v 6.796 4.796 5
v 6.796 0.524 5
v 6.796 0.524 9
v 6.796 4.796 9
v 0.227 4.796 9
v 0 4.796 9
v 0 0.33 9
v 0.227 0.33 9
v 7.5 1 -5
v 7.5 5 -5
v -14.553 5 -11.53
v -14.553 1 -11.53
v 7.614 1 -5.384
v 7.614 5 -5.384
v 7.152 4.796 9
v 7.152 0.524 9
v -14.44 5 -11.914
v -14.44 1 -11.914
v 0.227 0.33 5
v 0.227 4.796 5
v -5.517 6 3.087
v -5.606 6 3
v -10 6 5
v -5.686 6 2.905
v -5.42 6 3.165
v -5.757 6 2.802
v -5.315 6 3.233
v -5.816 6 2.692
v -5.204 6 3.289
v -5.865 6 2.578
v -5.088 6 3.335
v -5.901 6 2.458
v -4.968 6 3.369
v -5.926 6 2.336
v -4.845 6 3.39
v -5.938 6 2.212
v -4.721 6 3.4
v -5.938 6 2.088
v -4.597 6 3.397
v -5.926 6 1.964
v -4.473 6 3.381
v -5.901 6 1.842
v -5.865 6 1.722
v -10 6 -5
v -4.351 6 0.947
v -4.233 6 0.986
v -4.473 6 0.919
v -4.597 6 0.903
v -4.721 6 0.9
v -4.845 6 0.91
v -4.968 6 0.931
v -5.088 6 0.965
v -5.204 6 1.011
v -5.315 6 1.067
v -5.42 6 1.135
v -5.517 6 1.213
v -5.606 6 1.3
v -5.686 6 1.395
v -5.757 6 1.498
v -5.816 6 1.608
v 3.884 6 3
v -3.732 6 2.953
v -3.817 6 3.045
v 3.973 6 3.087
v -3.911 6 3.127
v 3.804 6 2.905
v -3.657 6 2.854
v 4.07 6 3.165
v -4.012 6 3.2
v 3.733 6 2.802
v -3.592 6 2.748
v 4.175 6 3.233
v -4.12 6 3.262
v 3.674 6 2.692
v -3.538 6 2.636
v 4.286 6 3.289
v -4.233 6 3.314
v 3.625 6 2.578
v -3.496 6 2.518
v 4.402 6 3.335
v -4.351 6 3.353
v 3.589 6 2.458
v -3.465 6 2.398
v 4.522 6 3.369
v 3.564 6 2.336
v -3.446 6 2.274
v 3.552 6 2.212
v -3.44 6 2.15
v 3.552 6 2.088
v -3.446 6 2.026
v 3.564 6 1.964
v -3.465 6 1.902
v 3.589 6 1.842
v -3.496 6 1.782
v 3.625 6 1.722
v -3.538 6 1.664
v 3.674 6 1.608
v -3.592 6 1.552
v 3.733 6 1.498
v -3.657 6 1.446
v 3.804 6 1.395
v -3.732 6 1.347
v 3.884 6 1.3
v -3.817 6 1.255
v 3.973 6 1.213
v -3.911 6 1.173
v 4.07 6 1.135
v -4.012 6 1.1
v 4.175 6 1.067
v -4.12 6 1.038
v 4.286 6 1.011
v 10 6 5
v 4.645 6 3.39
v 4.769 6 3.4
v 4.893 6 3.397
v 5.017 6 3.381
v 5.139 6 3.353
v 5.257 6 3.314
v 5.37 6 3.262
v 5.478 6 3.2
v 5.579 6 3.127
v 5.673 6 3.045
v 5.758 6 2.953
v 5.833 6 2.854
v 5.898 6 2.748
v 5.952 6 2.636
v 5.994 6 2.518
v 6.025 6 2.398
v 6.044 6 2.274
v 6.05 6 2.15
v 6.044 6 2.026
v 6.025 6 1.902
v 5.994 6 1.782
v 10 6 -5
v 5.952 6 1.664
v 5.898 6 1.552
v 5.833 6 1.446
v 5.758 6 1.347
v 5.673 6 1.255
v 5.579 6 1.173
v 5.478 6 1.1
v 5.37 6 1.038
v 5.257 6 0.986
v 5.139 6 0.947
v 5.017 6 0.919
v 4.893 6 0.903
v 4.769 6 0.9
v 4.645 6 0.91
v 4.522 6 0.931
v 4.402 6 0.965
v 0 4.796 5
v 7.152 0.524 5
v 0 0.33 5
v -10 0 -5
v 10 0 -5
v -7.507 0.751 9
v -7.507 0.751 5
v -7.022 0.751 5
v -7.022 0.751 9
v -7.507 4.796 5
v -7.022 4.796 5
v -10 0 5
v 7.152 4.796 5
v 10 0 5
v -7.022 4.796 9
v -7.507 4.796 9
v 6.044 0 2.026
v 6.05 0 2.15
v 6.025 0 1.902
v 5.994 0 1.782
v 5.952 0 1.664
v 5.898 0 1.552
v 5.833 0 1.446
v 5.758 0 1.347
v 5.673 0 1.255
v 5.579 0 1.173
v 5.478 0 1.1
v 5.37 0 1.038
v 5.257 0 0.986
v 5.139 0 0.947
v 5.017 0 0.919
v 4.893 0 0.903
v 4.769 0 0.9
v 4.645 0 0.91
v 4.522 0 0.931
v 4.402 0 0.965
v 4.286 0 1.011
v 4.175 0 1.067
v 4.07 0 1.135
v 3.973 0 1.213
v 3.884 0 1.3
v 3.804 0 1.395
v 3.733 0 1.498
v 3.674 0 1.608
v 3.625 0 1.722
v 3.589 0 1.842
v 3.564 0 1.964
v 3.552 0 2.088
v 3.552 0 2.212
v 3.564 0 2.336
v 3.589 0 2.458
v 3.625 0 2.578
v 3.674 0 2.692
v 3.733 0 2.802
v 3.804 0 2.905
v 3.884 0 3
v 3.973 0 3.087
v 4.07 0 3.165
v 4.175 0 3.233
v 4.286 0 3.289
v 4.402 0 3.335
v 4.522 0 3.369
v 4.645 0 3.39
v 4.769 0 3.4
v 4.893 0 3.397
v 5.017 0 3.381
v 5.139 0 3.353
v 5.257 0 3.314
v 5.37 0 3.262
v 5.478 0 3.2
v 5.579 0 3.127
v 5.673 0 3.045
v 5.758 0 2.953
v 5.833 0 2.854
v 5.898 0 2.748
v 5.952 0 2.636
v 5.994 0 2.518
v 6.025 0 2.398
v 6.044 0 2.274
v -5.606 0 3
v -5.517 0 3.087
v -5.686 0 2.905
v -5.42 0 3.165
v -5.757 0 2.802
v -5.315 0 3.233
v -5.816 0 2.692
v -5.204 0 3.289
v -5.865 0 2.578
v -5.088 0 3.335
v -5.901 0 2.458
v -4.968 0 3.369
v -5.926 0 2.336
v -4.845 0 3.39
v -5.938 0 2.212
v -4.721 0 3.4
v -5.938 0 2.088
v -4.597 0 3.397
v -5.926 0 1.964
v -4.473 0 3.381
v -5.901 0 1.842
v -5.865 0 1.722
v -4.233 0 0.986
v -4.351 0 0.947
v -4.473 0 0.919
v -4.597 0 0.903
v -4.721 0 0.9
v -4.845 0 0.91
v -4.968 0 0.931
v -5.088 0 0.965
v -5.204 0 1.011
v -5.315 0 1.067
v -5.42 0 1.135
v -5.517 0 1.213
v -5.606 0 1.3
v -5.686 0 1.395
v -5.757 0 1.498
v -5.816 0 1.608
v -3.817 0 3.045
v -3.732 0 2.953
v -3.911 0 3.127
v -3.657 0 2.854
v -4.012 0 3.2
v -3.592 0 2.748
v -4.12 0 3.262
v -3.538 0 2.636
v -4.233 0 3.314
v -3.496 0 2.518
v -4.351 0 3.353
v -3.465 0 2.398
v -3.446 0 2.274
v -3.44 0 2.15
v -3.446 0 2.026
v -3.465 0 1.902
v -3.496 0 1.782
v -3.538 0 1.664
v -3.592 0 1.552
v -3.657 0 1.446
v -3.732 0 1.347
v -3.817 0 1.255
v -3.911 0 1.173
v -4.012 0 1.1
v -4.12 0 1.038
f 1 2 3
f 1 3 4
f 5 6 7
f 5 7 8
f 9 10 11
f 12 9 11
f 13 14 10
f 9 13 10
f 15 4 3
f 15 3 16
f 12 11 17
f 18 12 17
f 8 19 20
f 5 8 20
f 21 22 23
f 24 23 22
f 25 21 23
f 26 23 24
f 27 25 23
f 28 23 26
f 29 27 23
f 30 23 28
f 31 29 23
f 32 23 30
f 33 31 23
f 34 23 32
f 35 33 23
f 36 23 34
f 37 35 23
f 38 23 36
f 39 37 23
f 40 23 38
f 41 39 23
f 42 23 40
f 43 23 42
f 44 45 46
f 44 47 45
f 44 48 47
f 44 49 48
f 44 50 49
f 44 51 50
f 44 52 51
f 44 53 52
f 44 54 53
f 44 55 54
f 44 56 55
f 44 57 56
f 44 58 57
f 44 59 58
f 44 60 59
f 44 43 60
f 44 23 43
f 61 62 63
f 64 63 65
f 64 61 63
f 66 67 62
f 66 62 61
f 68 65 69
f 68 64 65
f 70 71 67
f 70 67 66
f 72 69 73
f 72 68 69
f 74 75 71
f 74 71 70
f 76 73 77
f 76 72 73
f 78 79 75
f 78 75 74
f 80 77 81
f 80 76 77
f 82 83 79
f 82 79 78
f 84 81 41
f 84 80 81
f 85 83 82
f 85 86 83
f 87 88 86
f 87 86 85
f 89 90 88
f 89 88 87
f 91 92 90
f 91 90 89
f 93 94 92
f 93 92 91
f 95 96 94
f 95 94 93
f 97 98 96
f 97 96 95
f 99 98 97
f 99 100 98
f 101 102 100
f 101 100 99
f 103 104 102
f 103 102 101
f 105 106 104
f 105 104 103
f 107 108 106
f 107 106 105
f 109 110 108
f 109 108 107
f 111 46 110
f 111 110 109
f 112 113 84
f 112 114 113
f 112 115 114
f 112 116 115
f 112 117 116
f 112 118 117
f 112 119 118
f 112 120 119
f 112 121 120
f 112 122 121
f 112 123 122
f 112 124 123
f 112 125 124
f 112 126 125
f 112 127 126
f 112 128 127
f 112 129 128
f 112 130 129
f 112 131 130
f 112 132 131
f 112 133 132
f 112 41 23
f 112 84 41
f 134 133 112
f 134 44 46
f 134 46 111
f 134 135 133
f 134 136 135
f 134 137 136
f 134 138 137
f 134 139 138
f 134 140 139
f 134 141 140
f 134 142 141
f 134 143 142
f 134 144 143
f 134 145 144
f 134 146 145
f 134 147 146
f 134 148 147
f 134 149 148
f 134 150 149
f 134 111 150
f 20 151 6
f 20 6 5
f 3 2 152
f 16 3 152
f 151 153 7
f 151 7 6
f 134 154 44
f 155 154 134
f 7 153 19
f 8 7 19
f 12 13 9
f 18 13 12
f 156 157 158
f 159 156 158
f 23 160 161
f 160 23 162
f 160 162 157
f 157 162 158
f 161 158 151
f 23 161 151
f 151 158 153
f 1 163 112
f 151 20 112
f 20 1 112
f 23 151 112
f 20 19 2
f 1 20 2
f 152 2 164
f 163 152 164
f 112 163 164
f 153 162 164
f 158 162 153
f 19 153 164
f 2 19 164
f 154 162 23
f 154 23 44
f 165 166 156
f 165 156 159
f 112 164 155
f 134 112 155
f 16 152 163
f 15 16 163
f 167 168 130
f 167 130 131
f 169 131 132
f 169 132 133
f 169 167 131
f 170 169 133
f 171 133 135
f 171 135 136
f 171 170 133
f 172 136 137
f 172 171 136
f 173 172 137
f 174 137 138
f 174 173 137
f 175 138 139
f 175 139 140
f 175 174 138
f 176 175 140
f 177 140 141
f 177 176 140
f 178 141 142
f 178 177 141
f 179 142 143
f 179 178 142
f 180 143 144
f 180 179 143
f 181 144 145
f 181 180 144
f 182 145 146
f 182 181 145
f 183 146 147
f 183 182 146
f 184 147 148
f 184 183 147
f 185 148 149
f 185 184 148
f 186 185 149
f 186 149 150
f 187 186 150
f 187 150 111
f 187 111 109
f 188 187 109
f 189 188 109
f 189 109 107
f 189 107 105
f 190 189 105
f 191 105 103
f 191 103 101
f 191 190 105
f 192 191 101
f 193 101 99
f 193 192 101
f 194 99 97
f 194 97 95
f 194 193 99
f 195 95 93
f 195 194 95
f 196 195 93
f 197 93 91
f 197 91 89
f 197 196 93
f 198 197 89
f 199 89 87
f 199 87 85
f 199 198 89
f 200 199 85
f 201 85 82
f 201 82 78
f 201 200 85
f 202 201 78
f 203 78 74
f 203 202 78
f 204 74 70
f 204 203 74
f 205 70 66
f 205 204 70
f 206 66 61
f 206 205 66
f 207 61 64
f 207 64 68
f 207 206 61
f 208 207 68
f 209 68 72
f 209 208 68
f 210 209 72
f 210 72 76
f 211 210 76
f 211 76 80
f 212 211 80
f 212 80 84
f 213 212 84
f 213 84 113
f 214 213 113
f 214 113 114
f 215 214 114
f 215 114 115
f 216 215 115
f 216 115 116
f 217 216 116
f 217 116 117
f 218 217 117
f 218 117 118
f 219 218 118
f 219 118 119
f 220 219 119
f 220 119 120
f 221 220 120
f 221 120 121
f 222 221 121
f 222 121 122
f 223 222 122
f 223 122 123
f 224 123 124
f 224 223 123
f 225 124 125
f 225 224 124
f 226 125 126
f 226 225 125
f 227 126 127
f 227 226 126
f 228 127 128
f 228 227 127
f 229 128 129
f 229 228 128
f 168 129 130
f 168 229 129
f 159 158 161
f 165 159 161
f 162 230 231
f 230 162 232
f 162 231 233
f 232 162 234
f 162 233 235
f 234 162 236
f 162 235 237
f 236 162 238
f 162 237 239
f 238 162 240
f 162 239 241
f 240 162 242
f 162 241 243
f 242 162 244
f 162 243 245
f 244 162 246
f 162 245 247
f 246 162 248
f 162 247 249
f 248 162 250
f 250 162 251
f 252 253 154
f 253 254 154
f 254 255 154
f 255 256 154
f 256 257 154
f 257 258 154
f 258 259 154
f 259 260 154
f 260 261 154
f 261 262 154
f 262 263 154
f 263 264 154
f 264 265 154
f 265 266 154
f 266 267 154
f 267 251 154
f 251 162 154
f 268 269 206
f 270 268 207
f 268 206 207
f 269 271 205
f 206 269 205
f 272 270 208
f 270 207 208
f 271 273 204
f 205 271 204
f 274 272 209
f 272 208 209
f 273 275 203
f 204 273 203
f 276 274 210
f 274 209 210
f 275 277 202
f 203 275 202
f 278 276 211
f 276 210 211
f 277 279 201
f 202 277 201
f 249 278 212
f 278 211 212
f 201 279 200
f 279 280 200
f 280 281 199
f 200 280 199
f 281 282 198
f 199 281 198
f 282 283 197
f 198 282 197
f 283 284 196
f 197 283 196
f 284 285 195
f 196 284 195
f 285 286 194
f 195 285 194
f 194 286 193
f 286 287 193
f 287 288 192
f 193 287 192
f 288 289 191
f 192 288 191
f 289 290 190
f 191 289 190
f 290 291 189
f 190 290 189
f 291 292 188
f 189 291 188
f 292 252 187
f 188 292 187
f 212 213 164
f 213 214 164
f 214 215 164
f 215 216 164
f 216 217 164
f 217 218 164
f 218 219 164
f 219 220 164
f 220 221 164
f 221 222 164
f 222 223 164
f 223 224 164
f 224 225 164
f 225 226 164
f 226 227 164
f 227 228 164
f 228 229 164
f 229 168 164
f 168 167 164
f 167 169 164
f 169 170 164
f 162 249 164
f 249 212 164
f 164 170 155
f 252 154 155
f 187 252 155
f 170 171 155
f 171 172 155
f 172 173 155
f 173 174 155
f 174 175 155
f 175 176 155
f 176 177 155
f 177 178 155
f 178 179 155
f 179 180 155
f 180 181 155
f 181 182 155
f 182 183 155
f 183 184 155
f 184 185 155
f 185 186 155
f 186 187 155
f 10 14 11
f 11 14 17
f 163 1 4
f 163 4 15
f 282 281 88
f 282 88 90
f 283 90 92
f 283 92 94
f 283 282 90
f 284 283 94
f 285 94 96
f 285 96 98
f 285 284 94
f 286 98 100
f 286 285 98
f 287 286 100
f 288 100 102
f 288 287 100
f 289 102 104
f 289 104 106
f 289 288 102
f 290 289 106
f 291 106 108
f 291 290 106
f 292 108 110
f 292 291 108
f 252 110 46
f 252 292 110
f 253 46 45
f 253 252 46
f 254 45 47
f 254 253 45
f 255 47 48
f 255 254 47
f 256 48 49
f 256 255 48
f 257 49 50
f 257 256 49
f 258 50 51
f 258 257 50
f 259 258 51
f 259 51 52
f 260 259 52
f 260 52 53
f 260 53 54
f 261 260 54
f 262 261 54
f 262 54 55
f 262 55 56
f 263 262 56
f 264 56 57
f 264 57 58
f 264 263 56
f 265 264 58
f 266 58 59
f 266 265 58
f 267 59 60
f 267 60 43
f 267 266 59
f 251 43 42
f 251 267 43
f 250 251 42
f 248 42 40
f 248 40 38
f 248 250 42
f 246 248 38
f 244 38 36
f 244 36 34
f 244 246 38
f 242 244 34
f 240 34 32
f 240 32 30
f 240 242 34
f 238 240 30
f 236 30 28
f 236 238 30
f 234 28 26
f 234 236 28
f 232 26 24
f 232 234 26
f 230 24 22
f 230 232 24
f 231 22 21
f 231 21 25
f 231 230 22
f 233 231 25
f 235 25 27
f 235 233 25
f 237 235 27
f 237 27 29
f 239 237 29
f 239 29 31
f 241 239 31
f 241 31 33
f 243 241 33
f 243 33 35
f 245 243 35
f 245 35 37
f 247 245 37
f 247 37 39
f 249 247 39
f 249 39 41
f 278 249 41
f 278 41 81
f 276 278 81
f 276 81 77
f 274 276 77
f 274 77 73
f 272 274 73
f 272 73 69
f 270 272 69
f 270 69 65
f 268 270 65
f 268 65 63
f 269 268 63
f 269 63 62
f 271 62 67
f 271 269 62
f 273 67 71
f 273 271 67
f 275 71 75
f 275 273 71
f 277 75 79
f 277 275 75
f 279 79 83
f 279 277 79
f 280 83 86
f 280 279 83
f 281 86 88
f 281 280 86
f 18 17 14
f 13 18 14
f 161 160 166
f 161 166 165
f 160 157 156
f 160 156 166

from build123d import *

# Parameters (mm, degrees)
ESBO_O1_W                = 20
ESBO_O1_H                = 10
ESBO_O1_R                = 1.25
RESSALTO_EXTRUS_O1_DEPTH = 6
ESBO_O2_W                = 0.485398366
ESBO_O2_H                = 4.044986381
ESBO_O2_W_2              = 0.226519237
ESBO_O2_H_2              = 4.465664965
ESBO_O2_W_3              = 0.355958801
ESBO_O2_H_3              = 4.271505618
RESSALTO_EXTRUS_O2_DEPTH = 4
EXTRUS_O_FINA1_START     = -1
EXTRUS_O_FINA1_DEPTH     = 4


with BuildPart() as part:
    # Esboço1 → Ressalto-extrusão1 (new body)
    with BuildSketch(Plane(origin=(0, 0, 0), x_dir=(1, 0, 0), z_dir=(0, 1, 0))):
        Rectangle(ESBO_O1_W, ESBO_O1_H)
        with Locations((-4.69, -2.15)):
            Circle(ESBO_O1_R, mode=Mode.SUBTRACT)
        with Locations((4.8, -2.15)):
            Circle(ESBO_O1_R, mode=Mode.SUBTRACT)
    extrude(amount=RESSALTO_EXTRUS_O1_DEPTH)

    # Esboço2 → Ressalto-extrusão2 (add)
    with BuildSketch(Plane.XY.offset(5)):
        with Locations((-7.264795541, 2.773480763)):
            Rectangle(ESBO_O2_W, ESBO_O2_H)
        with Locations((0.113259619, 2.563141471)):
            Rectangle(ESBO_O2_W_2, ESBO_O2_H_2)
        with Locations((6.973556522, 2.660221144)):
            Rectangle(ESBO_O2_W_3, ESBO_O2_H_3)
    extrude(amount=RESSALTO_EXTRUS_O2_DEPTH)


with BuildPart() as body_2:
    # Esboço3 → Extrusão-Fina1 (new body)
    with BuildSketch(Plane(origin=(0, 6, 0), x_dir=(1, 0, 0), z_dir=(0, 1, 0)).offset(EXTRUS_O_FINA1_START)):
        Polygon((7.5, 5), (-14.553426034, 11.530421131), (-14.439853493, 11.913958975), (7.613572541, 5.383537844), align=None)
    extrude(amount=-EXTRUS_O_FINA1_DEPTH)


solid = Compound([part.part, body_2.part])
